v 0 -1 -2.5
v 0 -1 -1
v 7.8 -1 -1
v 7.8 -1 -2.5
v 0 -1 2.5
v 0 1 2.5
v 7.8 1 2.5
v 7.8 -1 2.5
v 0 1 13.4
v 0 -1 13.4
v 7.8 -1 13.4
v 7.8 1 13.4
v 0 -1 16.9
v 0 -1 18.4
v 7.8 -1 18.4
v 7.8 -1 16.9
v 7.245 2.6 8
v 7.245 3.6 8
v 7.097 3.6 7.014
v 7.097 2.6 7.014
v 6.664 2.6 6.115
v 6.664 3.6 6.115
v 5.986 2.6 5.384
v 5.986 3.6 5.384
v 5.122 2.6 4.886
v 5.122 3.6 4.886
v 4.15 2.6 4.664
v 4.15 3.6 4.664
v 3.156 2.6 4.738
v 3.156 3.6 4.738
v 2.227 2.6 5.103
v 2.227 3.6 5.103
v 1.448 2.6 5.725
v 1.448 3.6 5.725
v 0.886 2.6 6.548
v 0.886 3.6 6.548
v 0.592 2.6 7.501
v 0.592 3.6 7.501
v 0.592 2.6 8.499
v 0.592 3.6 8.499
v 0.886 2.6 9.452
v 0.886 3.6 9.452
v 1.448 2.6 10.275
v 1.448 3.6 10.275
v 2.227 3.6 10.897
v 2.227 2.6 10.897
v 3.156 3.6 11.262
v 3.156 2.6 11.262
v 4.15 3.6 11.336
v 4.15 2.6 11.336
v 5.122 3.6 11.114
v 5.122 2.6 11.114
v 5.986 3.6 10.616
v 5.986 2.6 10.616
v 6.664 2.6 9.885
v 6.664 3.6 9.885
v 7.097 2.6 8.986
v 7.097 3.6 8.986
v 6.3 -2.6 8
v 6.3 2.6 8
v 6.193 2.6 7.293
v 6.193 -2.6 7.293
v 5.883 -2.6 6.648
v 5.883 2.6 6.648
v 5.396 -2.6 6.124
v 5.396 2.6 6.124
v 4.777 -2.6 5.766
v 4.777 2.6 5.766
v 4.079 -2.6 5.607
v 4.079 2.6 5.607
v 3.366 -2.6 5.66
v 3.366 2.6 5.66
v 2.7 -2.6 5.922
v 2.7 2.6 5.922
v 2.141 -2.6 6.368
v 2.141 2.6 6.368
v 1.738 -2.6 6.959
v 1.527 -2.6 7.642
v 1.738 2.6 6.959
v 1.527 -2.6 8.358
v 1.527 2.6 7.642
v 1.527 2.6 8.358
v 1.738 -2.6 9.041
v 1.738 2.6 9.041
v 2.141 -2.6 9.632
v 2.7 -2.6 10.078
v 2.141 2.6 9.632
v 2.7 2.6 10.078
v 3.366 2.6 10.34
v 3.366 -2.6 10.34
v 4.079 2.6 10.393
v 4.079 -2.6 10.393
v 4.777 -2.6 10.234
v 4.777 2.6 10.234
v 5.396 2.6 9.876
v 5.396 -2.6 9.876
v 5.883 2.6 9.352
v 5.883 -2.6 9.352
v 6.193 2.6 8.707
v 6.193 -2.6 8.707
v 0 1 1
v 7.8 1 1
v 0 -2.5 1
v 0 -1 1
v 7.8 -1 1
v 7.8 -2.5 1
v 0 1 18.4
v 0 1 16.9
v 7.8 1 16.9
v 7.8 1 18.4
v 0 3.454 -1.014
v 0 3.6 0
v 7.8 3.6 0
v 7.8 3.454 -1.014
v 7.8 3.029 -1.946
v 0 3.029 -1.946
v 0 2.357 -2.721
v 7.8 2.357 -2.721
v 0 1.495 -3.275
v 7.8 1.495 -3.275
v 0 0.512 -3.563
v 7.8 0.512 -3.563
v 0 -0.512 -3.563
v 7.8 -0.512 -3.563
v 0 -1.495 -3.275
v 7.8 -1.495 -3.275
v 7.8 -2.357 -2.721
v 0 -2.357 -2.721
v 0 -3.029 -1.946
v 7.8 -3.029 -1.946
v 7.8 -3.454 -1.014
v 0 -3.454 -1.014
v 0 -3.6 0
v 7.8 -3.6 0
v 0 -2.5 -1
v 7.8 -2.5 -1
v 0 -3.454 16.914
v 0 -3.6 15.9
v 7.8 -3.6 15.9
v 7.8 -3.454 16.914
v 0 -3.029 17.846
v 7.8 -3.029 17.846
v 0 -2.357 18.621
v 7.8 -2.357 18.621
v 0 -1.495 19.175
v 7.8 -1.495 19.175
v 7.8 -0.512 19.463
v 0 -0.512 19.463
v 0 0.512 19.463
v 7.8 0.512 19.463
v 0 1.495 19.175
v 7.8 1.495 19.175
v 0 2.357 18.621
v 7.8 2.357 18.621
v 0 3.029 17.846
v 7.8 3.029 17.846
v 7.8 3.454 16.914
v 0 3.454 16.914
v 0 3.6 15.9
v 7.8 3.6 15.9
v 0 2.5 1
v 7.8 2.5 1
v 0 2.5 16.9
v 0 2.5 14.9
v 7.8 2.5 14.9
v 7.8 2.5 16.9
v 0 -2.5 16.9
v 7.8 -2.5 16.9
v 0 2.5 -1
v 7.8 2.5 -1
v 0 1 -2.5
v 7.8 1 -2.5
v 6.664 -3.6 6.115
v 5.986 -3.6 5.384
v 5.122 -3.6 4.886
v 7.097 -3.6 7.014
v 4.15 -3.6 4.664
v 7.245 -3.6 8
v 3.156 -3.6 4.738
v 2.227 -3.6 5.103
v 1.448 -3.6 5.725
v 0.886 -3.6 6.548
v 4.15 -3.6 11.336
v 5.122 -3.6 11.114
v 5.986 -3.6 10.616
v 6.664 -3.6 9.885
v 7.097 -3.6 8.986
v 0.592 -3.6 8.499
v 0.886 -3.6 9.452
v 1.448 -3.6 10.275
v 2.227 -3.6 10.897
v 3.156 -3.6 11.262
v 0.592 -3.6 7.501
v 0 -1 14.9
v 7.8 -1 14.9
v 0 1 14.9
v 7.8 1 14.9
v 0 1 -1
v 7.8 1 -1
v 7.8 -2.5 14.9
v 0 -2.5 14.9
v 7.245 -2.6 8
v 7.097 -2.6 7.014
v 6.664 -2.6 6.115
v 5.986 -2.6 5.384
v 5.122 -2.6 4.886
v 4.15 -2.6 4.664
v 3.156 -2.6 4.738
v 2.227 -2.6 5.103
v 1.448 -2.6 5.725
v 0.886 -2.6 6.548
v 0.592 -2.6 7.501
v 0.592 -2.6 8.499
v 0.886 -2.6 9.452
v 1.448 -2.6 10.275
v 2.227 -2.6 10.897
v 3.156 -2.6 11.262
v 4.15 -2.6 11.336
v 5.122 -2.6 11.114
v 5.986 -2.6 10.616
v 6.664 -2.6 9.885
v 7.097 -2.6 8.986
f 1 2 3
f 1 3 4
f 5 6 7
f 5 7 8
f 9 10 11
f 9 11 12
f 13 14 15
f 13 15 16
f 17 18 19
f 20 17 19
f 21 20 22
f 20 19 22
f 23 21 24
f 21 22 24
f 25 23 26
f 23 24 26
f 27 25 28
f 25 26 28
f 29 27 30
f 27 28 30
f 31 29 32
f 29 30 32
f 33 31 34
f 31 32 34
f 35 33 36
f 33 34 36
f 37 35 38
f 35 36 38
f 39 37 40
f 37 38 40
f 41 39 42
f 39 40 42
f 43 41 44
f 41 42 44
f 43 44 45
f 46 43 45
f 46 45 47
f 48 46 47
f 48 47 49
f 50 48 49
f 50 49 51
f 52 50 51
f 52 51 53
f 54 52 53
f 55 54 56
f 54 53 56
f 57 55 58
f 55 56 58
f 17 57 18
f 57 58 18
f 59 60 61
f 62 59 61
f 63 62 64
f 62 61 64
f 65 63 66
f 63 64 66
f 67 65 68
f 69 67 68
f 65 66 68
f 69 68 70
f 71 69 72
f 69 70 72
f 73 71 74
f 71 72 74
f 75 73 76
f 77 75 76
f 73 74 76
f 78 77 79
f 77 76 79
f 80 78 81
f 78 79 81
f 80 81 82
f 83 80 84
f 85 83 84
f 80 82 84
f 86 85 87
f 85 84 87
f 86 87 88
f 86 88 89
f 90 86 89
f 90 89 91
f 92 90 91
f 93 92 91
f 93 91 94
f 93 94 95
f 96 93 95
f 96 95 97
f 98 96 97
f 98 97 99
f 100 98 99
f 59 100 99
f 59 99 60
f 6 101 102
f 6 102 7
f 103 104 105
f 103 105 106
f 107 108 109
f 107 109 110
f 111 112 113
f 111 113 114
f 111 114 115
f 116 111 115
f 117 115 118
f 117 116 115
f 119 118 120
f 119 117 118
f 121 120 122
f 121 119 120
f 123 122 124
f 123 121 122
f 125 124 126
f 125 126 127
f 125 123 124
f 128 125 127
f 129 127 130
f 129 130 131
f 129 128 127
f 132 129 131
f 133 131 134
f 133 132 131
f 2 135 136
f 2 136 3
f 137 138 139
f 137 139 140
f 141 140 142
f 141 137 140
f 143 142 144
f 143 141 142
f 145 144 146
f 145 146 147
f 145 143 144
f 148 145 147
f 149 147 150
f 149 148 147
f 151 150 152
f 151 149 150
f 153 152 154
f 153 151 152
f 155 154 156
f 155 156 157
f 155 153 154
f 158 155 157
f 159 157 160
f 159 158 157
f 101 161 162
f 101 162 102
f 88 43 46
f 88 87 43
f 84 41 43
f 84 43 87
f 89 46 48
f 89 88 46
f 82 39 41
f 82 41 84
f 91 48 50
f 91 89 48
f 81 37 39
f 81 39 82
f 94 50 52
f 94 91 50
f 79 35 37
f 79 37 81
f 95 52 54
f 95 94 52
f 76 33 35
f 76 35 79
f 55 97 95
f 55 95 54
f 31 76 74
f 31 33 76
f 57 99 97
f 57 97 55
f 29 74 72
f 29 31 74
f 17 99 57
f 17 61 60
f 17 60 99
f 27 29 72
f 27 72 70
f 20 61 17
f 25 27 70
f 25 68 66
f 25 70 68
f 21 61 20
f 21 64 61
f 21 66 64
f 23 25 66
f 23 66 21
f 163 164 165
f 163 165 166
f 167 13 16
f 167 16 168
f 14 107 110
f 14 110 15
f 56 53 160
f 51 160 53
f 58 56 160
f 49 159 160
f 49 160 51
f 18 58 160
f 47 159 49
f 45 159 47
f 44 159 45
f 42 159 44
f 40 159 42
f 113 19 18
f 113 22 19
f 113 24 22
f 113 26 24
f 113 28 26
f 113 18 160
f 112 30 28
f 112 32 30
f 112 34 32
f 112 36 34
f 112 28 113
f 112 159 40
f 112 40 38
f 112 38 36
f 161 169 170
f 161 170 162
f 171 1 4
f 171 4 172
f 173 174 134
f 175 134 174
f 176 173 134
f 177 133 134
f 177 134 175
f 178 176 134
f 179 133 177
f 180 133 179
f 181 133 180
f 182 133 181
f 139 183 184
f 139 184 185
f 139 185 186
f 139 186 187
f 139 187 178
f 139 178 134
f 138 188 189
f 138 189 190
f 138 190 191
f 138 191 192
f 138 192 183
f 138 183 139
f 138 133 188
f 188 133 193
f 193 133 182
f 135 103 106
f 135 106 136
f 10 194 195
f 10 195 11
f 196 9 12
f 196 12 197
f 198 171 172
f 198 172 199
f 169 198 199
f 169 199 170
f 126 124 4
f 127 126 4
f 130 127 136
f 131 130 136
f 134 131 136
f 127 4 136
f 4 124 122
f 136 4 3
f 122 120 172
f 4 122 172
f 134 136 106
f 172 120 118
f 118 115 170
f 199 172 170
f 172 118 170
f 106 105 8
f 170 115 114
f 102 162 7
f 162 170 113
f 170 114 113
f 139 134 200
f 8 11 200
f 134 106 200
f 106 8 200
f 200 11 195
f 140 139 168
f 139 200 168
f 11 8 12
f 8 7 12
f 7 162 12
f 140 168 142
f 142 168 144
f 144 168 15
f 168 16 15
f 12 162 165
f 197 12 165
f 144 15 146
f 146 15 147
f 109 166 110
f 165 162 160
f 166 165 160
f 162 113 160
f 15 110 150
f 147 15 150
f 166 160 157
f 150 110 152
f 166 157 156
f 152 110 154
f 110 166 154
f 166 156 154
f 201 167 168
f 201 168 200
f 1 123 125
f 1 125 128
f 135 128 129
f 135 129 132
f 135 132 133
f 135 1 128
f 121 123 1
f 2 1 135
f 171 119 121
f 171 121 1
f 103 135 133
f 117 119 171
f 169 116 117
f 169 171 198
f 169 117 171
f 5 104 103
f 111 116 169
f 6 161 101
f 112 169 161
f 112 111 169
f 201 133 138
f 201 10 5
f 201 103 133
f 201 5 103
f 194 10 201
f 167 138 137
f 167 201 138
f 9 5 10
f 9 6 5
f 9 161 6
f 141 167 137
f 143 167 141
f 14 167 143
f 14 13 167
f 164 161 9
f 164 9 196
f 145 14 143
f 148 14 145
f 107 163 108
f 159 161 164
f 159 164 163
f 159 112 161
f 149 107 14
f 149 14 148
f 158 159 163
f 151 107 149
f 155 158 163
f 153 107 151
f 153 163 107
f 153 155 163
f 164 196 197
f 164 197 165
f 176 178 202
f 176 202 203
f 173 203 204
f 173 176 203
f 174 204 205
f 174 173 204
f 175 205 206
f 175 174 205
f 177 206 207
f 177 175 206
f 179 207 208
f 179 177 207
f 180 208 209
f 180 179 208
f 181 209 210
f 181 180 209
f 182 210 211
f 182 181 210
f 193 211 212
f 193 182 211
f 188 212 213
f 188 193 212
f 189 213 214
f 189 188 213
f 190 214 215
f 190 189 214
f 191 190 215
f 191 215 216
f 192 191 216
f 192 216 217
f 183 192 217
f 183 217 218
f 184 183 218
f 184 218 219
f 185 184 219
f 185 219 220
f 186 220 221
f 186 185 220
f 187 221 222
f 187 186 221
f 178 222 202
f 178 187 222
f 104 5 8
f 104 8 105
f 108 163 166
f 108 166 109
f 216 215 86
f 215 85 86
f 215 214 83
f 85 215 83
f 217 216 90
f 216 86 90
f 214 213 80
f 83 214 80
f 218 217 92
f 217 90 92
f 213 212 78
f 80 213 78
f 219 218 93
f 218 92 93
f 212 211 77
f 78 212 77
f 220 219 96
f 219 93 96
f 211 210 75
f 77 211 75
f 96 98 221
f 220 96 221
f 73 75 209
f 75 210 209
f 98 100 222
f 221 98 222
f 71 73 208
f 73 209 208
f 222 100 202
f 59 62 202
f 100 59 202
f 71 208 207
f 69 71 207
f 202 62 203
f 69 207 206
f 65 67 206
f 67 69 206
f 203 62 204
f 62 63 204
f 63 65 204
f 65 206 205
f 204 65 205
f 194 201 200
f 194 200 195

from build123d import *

# Parameters (mm, degrees)
BOSS_EXTRUDE1_DEPTH = 7.8
SKETCH3_R           = 2.4
CUT_EXTRUDE1_DEPTH  = 7.2
SKETCH6_R           = 3.345382302
SKETCH6_R_2         = 2.4
CUT_EXTRUDE3_DEPTH  = 1


with BuildPart() as part:
    # Sketch1 → Boss-Extrude1 (new body)
    with BuildSketch(Plane(origin=(0, 0, 0), x_dir=(0, 0, -1), z_dir=(1, 0, 0))):
        with BuildLine():
            Line((0, -3.6), (-15.9, -3.6))
            ThreePointArc((-15.9, -3.6), (-19.5, 0), (-15.9, 3.6))
            Line((-15.9, 3.6), (0, 3.6))
            ThreePointArc((0, 3.6), (3.6, 0), (0, -3.6))
        make_face()
        Polygon((-2.5, -1), (-1, -1), (-1, -2.5), (1, -2.5), (1, -1), (2.5, -1), (2.5, 1), (1, 1), (1, 2.5), (-1, 2.5), (-1, 1), (-2.5, 1), align=None, mode=Mode.SUBTRACT)
        Polygon((-13.4, -1), (-13.4, 1), (-14.9, 1), (-14.9, 2.5), (-16.9, 2.5), (-16.9, 1), (-18.4, 1), (-18.4, -1), (-16.9, -1), (-16.9, -2.5), (-14.9, -2.5), (-14.9, -1), align=None, mode=Mode.SUBTRACT)
    extrude(amount=BOSS_EXTRUDE1_DEPTH)

    # Sketch3 → Cut-Extrude1 (cut)
    with BuildSketch(Plane(origin=(0, 3.6, 0), x_dir=(1, 0, 0), z_dir=(0, 1, 0))):
        with Locations((3.9, -8)):
            Circle(SKETCH3_R)
    extrude(amount=-CUT_EXTRUDE1_DEPTH, mode=Mode.SUBTRACT)

    # Sketch6 → Cut-Extrude3 (cut)
    with BuildSketch(Plane(origin=(0, 3.6, 0), x_dir=(1, 0, 0), z_dir=(0, 1, 0))):
        with Locations((3.9, -8)):
            Circle(SKETCH6_R)
        with Locations((3.9, -8)):
            Circle(SKETCH6_R_2, mode=Mode.SUBTRACT)
    cut_extrude3 = extrude(amount=-CUT_EXTRUDE3_DEPTH, mode=Mode.SUBTRACT)

    # Mirror1: Cut-Extrude3 across plane
    add(cut_extrude3.mirror(Plane(origin=(0, 0, 0), x_dir=(0, 0, 1), z_dir=(0, -1, 0))), mode=Mode.SUBTRACT)


solid = part.part
